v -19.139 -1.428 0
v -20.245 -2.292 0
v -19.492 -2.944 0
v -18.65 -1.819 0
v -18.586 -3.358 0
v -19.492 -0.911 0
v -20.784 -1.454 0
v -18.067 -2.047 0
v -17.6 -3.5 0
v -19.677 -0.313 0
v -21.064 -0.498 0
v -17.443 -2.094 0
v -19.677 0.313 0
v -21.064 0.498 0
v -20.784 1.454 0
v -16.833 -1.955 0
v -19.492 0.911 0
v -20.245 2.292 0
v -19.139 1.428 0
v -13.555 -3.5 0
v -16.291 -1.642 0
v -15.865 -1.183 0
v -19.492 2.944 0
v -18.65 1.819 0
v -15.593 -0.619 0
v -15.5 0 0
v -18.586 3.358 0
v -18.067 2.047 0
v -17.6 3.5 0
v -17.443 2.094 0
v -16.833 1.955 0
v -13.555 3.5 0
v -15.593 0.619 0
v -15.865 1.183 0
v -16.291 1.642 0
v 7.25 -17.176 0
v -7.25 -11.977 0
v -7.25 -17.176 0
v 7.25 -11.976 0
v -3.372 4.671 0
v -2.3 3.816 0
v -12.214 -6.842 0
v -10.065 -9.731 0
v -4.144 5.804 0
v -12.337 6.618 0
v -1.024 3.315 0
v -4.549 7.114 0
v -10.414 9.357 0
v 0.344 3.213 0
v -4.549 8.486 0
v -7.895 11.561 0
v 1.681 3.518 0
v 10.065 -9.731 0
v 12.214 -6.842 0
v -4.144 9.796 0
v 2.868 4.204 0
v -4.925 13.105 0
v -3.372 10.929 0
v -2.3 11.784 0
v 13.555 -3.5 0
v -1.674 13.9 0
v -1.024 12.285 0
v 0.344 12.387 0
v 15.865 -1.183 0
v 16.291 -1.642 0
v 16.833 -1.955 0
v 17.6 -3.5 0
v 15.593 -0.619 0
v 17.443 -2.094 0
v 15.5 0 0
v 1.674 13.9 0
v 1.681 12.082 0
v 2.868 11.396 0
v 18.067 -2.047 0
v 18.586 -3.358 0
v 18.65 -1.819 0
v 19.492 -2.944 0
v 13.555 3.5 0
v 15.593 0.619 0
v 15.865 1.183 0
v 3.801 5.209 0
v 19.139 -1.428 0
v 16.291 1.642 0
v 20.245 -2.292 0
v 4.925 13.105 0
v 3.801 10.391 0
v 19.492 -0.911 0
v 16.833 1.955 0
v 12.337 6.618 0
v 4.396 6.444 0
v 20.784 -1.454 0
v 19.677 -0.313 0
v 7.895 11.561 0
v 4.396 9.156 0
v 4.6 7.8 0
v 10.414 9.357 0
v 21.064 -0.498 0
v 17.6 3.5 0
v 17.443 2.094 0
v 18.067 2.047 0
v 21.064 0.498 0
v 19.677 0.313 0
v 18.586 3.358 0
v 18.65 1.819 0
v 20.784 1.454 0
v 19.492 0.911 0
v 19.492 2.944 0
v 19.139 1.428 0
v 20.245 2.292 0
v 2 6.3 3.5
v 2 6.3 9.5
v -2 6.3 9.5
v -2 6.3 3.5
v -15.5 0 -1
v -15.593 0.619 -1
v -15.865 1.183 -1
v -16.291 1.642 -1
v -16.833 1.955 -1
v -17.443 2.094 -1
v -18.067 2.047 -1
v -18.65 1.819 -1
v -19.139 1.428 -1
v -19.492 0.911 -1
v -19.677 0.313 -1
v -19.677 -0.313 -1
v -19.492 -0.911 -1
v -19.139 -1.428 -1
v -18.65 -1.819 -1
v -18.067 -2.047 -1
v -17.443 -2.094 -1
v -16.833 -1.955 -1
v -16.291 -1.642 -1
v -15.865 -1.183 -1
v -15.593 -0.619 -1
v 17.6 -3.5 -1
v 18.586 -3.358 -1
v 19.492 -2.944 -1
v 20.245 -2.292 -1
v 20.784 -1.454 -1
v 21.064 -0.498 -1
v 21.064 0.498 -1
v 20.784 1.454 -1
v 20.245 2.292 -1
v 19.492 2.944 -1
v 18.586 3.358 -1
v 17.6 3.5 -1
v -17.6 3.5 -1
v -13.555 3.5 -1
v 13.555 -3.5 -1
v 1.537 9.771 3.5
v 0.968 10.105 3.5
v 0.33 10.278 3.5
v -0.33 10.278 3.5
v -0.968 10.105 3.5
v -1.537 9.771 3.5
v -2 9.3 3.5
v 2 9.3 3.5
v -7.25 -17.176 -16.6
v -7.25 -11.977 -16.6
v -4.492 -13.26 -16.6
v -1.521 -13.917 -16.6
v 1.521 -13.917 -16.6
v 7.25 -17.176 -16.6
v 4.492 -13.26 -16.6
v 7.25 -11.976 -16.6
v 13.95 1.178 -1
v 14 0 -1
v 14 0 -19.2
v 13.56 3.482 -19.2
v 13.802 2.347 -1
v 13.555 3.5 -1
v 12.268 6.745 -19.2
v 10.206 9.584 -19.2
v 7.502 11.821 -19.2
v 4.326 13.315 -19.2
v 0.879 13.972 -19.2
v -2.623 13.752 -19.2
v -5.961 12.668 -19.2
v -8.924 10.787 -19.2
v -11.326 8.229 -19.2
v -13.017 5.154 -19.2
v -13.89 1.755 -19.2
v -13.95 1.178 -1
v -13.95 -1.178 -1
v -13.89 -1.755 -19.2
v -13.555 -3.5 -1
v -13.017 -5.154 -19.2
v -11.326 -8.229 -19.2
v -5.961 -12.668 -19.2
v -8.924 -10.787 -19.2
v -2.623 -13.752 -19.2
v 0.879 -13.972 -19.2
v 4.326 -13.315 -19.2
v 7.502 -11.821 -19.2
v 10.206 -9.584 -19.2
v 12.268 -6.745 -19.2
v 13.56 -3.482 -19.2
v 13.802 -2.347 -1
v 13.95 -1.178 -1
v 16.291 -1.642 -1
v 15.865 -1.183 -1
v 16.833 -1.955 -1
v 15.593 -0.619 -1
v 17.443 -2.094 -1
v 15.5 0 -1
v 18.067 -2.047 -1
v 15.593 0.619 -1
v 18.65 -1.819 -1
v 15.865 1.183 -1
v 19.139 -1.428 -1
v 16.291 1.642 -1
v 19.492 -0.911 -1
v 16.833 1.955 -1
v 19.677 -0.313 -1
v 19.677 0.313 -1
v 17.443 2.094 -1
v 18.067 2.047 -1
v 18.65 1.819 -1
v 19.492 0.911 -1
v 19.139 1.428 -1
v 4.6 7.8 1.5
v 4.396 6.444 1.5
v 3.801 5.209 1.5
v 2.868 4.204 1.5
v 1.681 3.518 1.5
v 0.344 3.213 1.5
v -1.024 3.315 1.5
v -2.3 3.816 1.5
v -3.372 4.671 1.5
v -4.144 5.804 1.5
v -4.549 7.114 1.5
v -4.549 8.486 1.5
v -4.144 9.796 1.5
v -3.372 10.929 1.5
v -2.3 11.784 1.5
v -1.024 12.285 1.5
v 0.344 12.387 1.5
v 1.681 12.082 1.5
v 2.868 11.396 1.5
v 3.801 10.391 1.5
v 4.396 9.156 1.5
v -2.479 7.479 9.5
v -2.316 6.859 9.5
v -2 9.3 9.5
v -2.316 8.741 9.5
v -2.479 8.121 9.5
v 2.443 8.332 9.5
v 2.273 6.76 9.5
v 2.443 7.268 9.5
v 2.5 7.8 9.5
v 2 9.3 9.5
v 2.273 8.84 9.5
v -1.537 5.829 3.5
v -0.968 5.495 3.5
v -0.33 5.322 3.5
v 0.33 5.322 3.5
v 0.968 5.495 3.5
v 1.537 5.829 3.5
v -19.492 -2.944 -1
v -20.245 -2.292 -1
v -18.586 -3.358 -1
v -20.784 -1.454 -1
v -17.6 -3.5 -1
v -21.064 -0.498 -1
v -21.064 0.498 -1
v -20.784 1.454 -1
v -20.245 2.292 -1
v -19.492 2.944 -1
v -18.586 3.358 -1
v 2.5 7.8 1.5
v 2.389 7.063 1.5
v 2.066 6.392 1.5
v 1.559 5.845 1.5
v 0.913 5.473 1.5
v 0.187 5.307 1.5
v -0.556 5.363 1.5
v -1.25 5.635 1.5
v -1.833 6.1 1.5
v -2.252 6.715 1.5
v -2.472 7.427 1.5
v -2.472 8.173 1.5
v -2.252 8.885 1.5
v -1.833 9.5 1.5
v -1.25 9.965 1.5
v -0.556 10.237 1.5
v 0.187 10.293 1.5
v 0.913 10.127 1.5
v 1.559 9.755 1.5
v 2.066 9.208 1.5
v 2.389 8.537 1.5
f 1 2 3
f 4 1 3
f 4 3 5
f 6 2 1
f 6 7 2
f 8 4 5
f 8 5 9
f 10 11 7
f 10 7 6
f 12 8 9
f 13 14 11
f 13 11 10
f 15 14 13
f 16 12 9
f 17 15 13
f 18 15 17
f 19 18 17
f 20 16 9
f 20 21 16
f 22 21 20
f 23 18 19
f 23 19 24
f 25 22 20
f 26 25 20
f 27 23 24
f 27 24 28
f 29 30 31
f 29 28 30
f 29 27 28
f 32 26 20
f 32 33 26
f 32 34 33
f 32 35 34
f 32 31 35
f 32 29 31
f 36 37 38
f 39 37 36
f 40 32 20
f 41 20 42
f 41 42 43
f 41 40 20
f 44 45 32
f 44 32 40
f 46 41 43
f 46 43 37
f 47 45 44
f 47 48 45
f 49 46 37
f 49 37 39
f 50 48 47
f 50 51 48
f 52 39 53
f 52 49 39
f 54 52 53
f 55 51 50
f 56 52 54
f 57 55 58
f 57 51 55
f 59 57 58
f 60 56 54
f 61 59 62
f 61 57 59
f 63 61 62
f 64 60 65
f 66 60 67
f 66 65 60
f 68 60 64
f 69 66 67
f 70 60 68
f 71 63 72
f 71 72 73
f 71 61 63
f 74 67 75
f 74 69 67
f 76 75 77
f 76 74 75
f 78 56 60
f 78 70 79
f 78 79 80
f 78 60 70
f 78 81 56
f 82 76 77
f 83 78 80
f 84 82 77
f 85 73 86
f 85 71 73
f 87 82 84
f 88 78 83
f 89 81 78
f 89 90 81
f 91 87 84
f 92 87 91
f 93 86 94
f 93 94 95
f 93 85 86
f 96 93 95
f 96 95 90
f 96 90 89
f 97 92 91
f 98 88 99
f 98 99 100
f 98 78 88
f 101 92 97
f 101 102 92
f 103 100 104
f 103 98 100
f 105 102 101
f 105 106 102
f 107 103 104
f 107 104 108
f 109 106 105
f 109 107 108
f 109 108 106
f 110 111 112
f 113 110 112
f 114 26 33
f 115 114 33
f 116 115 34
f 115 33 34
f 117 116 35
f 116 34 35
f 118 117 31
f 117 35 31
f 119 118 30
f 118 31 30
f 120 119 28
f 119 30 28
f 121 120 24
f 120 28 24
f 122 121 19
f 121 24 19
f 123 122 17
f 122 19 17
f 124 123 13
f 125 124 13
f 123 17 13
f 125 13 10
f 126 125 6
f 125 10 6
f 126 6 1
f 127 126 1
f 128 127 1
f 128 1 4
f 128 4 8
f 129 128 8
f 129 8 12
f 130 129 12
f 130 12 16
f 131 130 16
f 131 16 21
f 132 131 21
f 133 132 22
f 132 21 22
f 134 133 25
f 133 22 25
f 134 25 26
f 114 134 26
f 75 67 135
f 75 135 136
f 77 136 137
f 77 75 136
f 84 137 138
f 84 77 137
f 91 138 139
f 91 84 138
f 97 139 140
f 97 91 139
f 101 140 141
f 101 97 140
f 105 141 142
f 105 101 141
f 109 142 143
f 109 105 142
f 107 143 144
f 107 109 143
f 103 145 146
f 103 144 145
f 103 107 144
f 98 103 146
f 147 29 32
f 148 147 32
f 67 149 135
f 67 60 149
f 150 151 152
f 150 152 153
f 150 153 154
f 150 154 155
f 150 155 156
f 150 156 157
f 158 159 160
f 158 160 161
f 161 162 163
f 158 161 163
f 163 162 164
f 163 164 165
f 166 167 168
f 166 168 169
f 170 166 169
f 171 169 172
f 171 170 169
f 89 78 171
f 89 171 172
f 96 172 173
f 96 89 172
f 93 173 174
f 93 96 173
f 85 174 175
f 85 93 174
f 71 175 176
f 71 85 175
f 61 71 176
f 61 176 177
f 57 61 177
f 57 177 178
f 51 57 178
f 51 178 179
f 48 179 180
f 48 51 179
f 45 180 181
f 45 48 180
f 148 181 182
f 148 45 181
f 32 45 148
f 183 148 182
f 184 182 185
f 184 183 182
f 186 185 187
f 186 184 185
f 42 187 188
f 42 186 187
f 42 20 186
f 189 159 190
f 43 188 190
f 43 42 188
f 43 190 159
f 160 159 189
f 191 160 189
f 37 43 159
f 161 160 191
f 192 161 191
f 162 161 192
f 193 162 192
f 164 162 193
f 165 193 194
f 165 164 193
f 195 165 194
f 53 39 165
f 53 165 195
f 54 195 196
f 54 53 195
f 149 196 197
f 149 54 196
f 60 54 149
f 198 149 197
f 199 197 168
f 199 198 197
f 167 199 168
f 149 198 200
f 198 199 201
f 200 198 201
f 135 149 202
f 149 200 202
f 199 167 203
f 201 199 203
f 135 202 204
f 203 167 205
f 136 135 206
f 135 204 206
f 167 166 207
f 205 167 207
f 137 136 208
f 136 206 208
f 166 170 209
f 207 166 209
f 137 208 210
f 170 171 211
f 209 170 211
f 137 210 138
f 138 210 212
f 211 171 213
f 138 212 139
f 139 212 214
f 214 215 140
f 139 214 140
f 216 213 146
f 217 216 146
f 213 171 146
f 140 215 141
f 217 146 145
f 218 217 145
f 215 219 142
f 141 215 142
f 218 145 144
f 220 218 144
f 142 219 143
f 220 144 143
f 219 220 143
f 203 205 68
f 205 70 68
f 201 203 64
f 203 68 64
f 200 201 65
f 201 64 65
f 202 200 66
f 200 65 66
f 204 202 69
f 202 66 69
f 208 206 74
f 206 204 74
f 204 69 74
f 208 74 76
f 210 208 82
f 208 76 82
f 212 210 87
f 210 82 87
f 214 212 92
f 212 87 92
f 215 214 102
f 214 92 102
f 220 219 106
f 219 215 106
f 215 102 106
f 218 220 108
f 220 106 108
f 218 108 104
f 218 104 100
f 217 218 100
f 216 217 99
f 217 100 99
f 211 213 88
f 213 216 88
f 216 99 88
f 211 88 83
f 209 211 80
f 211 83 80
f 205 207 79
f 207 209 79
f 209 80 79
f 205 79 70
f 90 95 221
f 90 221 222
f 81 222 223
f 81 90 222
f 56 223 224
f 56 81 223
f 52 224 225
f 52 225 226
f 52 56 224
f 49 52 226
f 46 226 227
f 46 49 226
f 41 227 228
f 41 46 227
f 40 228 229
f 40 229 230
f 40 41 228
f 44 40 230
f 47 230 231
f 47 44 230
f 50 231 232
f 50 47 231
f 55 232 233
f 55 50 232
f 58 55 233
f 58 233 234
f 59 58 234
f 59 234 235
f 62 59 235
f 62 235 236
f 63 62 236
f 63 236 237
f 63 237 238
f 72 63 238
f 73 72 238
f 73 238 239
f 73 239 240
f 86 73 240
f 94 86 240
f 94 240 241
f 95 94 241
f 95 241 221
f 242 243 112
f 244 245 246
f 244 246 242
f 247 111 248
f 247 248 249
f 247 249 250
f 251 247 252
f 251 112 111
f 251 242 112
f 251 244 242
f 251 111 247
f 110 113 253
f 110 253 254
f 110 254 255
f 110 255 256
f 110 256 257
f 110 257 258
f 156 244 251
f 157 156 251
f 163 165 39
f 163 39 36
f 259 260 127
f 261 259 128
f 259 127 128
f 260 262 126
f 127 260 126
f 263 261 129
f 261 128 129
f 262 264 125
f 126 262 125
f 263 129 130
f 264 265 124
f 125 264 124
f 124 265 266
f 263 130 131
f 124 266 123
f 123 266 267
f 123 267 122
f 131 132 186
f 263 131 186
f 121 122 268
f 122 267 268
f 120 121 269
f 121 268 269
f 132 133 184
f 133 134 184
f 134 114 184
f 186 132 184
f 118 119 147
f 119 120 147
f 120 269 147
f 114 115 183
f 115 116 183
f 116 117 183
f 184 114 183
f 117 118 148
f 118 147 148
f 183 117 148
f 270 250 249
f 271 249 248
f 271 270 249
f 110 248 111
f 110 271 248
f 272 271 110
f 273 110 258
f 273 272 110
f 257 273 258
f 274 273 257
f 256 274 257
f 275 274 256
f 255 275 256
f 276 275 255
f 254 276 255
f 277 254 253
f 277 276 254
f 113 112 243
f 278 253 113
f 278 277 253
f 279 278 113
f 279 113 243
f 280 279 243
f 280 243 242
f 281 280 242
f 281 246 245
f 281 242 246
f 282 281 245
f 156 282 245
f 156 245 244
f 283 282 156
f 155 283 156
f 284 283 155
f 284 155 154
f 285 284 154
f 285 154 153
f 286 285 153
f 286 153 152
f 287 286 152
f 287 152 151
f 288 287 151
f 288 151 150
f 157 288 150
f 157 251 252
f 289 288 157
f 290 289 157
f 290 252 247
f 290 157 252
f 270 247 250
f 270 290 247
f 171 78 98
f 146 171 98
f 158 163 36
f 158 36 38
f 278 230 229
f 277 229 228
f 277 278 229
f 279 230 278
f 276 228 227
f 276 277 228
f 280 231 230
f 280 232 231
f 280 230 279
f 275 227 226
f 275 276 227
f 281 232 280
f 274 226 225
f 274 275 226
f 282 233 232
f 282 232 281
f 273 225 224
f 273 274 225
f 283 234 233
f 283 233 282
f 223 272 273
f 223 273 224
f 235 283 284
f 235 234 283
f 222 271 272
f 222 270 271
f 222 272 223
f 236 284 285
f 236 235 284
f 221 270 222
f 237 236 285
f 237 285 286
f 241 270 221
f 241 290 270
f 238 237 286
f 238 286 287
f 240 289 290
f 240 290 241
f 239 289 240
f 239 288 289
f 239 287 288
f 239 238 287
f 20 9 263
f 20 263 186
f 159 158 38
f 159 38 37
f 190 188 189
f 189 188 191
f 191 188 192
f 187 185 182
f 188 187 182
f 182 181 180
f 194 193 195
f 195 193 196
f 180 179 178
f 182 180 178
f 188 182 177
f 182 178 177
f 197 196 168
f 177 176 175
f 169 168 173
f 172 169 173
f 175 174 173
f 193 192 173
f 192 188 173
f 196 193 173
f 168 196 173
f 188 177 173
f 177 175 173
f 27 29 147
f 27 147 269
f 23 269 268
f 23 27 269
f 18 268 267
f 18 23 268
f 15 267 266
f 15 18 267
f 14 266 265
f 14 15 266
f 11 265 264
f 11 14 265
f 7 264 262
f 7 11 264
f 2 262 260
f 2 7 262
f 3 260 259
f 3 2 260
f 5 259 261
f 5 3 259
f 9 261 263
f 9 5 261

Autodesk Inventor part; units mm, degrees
ref_plane "YZ Plane" through (0, 0, 0) normal (1, 0, 0) x (0, 1, 0)
ref_plane "XZ Plane" through (0, 0, 0) normal (0, 1, 0) x (-1, 0, 0)
ref_plane "XY Plane" through (0, 0, 0) normal (0, 0, 1) x (1, 0, 0)
sketch "스케치1" plane through (0, 0, 0) normal (0, 0, 1) x (1, 0, 0)
  circle A0 centre (0, 0) radius 14
  line L0 (-7.25, -10.8235) -> (7.25, -10.8235) construction
  line L1 (7.25, -10.8235) -> (7.25, -17.1765)
  line L2 (7.25, -17.1765) -> (-7.25, -17.1765)
  line L3 (-7.25, -17.1765) -> (-7.25, -10.8235)
  line L4 (-7.25, -10.8235) -> (7.25, -17.1765) construction
  line L5 (7.25, -10.8235) -> (-7.25, -17.1765) construction
  line L6 (7.25, -11.9765) -> (7.25, -17.1765)
  line L7 (0, -14) -> (0, 0)
  point P0 (-7.25, -11.9765)
  dimension "d0" = 28
  dimension "d1" = 5.2
  dimension "d2" = 14.5
extrude "돌출1" add sketch "스케치1" against normal blind 19.2 contours A0
extrude "돌출2" add sketch "스케치1" against normal blind 16.6 contours A0 L1 L2 L3
sketch "스케치2" plane through (0, 0, 0) normal (0, 0, 1) x (1, 0, 0)
  circle A0 centre (-17.6, 0) radius 2.1
  circle A1 centre (-17.6, 0) radius 3.5
  line L0 (-17.6, 3.5) -> (-13.5554, 3.5)
  line L1 (-17.6, -3.5) -> (-13.5554, -3.5)
  line L2 (-17.6, 0) -> (0, 0)
  arc A2 (7.25, -11.9765) -> (-7.25, -11.9765) centre (0, 0) ccw projected
  dimension "d7" = 4.2
  dimension "d8" = 7
  dimension "d9" = 17.6
extrude "돌출3" add sketch "스케치2" against normal blind 1
mirror "미러1" about plane through (0, 0, 0) normal (1, 0, 0) of "돌출3"
sketch "스케치3" plane through (0, 0, 0) normal (0, 0, 1) x (1, 0, 0)
  circle A0 centre (0, 7.8) radius 4.6
  line L0 (0, 12.4) -> (0, 14)
  arc A1 (13.5554, 3.5) -> (-13.5554, 3.5) centre (0, 0) ccw projected
  line L1 (0, 7.8) -> (0, 0)
  point P0 (0, 14)
  dimension "d12" = 9.2
  dimension "d13" = 1.6
extrude "돌출4" add sketch "스케치3" along normal blind 1.5
sketch "스케치4" plane through (0, 7.8, 1.5) normal (0, 0, 1) x (1, 0, 0)
  circle A0 centre (0, 0) radius 4.6 projected
  circle A1 centre (0, 0) radius 2.5
  point P0 (0, -7.8)
  dimension "d16" = 5
extrude "돌출5" add sketch "스케치4" along normal blind 8 contours A1
sketch "스케치5" plane through (0, 7.8, 9.5) normal (0, 0, 1) x (1, 0, 0)
  circle A0 centre (0, 0) radius 2.5 projected
  line L0 (-2.5, 1.5) -> (2.5, 1.5)
  line L1 (2.5, 1.5) -> (2.5, -1.5)
  line L2 (2.5, -1.5) -> (-2.5, -1.5)
  line L3 (-2.5, -1.5) -> (-2.5, 1.5)
  line L4 (-2.5, 1.5) -> (2.5, -1.5) construction
  line L5 (2.5, 1.5) -> (-2.5, -1.5) construction
  point P0 (0, -7.8)
  point P1 (2, -1.5)
  point P2 (-2, -1.5)
  point P3 (-2, 1.5)
  point P4 (2, 1.5)
  dimension "d19" = 3
extrude "돌출6" cut sketch "스케치5" against normal blind 6 contours L0 A0 | A0 L2
ref_plane "작업 평면1" through (0, 0, 0) normal (1, 0, 0) x (0, 1, 0)
properties part number "스텝모터"
